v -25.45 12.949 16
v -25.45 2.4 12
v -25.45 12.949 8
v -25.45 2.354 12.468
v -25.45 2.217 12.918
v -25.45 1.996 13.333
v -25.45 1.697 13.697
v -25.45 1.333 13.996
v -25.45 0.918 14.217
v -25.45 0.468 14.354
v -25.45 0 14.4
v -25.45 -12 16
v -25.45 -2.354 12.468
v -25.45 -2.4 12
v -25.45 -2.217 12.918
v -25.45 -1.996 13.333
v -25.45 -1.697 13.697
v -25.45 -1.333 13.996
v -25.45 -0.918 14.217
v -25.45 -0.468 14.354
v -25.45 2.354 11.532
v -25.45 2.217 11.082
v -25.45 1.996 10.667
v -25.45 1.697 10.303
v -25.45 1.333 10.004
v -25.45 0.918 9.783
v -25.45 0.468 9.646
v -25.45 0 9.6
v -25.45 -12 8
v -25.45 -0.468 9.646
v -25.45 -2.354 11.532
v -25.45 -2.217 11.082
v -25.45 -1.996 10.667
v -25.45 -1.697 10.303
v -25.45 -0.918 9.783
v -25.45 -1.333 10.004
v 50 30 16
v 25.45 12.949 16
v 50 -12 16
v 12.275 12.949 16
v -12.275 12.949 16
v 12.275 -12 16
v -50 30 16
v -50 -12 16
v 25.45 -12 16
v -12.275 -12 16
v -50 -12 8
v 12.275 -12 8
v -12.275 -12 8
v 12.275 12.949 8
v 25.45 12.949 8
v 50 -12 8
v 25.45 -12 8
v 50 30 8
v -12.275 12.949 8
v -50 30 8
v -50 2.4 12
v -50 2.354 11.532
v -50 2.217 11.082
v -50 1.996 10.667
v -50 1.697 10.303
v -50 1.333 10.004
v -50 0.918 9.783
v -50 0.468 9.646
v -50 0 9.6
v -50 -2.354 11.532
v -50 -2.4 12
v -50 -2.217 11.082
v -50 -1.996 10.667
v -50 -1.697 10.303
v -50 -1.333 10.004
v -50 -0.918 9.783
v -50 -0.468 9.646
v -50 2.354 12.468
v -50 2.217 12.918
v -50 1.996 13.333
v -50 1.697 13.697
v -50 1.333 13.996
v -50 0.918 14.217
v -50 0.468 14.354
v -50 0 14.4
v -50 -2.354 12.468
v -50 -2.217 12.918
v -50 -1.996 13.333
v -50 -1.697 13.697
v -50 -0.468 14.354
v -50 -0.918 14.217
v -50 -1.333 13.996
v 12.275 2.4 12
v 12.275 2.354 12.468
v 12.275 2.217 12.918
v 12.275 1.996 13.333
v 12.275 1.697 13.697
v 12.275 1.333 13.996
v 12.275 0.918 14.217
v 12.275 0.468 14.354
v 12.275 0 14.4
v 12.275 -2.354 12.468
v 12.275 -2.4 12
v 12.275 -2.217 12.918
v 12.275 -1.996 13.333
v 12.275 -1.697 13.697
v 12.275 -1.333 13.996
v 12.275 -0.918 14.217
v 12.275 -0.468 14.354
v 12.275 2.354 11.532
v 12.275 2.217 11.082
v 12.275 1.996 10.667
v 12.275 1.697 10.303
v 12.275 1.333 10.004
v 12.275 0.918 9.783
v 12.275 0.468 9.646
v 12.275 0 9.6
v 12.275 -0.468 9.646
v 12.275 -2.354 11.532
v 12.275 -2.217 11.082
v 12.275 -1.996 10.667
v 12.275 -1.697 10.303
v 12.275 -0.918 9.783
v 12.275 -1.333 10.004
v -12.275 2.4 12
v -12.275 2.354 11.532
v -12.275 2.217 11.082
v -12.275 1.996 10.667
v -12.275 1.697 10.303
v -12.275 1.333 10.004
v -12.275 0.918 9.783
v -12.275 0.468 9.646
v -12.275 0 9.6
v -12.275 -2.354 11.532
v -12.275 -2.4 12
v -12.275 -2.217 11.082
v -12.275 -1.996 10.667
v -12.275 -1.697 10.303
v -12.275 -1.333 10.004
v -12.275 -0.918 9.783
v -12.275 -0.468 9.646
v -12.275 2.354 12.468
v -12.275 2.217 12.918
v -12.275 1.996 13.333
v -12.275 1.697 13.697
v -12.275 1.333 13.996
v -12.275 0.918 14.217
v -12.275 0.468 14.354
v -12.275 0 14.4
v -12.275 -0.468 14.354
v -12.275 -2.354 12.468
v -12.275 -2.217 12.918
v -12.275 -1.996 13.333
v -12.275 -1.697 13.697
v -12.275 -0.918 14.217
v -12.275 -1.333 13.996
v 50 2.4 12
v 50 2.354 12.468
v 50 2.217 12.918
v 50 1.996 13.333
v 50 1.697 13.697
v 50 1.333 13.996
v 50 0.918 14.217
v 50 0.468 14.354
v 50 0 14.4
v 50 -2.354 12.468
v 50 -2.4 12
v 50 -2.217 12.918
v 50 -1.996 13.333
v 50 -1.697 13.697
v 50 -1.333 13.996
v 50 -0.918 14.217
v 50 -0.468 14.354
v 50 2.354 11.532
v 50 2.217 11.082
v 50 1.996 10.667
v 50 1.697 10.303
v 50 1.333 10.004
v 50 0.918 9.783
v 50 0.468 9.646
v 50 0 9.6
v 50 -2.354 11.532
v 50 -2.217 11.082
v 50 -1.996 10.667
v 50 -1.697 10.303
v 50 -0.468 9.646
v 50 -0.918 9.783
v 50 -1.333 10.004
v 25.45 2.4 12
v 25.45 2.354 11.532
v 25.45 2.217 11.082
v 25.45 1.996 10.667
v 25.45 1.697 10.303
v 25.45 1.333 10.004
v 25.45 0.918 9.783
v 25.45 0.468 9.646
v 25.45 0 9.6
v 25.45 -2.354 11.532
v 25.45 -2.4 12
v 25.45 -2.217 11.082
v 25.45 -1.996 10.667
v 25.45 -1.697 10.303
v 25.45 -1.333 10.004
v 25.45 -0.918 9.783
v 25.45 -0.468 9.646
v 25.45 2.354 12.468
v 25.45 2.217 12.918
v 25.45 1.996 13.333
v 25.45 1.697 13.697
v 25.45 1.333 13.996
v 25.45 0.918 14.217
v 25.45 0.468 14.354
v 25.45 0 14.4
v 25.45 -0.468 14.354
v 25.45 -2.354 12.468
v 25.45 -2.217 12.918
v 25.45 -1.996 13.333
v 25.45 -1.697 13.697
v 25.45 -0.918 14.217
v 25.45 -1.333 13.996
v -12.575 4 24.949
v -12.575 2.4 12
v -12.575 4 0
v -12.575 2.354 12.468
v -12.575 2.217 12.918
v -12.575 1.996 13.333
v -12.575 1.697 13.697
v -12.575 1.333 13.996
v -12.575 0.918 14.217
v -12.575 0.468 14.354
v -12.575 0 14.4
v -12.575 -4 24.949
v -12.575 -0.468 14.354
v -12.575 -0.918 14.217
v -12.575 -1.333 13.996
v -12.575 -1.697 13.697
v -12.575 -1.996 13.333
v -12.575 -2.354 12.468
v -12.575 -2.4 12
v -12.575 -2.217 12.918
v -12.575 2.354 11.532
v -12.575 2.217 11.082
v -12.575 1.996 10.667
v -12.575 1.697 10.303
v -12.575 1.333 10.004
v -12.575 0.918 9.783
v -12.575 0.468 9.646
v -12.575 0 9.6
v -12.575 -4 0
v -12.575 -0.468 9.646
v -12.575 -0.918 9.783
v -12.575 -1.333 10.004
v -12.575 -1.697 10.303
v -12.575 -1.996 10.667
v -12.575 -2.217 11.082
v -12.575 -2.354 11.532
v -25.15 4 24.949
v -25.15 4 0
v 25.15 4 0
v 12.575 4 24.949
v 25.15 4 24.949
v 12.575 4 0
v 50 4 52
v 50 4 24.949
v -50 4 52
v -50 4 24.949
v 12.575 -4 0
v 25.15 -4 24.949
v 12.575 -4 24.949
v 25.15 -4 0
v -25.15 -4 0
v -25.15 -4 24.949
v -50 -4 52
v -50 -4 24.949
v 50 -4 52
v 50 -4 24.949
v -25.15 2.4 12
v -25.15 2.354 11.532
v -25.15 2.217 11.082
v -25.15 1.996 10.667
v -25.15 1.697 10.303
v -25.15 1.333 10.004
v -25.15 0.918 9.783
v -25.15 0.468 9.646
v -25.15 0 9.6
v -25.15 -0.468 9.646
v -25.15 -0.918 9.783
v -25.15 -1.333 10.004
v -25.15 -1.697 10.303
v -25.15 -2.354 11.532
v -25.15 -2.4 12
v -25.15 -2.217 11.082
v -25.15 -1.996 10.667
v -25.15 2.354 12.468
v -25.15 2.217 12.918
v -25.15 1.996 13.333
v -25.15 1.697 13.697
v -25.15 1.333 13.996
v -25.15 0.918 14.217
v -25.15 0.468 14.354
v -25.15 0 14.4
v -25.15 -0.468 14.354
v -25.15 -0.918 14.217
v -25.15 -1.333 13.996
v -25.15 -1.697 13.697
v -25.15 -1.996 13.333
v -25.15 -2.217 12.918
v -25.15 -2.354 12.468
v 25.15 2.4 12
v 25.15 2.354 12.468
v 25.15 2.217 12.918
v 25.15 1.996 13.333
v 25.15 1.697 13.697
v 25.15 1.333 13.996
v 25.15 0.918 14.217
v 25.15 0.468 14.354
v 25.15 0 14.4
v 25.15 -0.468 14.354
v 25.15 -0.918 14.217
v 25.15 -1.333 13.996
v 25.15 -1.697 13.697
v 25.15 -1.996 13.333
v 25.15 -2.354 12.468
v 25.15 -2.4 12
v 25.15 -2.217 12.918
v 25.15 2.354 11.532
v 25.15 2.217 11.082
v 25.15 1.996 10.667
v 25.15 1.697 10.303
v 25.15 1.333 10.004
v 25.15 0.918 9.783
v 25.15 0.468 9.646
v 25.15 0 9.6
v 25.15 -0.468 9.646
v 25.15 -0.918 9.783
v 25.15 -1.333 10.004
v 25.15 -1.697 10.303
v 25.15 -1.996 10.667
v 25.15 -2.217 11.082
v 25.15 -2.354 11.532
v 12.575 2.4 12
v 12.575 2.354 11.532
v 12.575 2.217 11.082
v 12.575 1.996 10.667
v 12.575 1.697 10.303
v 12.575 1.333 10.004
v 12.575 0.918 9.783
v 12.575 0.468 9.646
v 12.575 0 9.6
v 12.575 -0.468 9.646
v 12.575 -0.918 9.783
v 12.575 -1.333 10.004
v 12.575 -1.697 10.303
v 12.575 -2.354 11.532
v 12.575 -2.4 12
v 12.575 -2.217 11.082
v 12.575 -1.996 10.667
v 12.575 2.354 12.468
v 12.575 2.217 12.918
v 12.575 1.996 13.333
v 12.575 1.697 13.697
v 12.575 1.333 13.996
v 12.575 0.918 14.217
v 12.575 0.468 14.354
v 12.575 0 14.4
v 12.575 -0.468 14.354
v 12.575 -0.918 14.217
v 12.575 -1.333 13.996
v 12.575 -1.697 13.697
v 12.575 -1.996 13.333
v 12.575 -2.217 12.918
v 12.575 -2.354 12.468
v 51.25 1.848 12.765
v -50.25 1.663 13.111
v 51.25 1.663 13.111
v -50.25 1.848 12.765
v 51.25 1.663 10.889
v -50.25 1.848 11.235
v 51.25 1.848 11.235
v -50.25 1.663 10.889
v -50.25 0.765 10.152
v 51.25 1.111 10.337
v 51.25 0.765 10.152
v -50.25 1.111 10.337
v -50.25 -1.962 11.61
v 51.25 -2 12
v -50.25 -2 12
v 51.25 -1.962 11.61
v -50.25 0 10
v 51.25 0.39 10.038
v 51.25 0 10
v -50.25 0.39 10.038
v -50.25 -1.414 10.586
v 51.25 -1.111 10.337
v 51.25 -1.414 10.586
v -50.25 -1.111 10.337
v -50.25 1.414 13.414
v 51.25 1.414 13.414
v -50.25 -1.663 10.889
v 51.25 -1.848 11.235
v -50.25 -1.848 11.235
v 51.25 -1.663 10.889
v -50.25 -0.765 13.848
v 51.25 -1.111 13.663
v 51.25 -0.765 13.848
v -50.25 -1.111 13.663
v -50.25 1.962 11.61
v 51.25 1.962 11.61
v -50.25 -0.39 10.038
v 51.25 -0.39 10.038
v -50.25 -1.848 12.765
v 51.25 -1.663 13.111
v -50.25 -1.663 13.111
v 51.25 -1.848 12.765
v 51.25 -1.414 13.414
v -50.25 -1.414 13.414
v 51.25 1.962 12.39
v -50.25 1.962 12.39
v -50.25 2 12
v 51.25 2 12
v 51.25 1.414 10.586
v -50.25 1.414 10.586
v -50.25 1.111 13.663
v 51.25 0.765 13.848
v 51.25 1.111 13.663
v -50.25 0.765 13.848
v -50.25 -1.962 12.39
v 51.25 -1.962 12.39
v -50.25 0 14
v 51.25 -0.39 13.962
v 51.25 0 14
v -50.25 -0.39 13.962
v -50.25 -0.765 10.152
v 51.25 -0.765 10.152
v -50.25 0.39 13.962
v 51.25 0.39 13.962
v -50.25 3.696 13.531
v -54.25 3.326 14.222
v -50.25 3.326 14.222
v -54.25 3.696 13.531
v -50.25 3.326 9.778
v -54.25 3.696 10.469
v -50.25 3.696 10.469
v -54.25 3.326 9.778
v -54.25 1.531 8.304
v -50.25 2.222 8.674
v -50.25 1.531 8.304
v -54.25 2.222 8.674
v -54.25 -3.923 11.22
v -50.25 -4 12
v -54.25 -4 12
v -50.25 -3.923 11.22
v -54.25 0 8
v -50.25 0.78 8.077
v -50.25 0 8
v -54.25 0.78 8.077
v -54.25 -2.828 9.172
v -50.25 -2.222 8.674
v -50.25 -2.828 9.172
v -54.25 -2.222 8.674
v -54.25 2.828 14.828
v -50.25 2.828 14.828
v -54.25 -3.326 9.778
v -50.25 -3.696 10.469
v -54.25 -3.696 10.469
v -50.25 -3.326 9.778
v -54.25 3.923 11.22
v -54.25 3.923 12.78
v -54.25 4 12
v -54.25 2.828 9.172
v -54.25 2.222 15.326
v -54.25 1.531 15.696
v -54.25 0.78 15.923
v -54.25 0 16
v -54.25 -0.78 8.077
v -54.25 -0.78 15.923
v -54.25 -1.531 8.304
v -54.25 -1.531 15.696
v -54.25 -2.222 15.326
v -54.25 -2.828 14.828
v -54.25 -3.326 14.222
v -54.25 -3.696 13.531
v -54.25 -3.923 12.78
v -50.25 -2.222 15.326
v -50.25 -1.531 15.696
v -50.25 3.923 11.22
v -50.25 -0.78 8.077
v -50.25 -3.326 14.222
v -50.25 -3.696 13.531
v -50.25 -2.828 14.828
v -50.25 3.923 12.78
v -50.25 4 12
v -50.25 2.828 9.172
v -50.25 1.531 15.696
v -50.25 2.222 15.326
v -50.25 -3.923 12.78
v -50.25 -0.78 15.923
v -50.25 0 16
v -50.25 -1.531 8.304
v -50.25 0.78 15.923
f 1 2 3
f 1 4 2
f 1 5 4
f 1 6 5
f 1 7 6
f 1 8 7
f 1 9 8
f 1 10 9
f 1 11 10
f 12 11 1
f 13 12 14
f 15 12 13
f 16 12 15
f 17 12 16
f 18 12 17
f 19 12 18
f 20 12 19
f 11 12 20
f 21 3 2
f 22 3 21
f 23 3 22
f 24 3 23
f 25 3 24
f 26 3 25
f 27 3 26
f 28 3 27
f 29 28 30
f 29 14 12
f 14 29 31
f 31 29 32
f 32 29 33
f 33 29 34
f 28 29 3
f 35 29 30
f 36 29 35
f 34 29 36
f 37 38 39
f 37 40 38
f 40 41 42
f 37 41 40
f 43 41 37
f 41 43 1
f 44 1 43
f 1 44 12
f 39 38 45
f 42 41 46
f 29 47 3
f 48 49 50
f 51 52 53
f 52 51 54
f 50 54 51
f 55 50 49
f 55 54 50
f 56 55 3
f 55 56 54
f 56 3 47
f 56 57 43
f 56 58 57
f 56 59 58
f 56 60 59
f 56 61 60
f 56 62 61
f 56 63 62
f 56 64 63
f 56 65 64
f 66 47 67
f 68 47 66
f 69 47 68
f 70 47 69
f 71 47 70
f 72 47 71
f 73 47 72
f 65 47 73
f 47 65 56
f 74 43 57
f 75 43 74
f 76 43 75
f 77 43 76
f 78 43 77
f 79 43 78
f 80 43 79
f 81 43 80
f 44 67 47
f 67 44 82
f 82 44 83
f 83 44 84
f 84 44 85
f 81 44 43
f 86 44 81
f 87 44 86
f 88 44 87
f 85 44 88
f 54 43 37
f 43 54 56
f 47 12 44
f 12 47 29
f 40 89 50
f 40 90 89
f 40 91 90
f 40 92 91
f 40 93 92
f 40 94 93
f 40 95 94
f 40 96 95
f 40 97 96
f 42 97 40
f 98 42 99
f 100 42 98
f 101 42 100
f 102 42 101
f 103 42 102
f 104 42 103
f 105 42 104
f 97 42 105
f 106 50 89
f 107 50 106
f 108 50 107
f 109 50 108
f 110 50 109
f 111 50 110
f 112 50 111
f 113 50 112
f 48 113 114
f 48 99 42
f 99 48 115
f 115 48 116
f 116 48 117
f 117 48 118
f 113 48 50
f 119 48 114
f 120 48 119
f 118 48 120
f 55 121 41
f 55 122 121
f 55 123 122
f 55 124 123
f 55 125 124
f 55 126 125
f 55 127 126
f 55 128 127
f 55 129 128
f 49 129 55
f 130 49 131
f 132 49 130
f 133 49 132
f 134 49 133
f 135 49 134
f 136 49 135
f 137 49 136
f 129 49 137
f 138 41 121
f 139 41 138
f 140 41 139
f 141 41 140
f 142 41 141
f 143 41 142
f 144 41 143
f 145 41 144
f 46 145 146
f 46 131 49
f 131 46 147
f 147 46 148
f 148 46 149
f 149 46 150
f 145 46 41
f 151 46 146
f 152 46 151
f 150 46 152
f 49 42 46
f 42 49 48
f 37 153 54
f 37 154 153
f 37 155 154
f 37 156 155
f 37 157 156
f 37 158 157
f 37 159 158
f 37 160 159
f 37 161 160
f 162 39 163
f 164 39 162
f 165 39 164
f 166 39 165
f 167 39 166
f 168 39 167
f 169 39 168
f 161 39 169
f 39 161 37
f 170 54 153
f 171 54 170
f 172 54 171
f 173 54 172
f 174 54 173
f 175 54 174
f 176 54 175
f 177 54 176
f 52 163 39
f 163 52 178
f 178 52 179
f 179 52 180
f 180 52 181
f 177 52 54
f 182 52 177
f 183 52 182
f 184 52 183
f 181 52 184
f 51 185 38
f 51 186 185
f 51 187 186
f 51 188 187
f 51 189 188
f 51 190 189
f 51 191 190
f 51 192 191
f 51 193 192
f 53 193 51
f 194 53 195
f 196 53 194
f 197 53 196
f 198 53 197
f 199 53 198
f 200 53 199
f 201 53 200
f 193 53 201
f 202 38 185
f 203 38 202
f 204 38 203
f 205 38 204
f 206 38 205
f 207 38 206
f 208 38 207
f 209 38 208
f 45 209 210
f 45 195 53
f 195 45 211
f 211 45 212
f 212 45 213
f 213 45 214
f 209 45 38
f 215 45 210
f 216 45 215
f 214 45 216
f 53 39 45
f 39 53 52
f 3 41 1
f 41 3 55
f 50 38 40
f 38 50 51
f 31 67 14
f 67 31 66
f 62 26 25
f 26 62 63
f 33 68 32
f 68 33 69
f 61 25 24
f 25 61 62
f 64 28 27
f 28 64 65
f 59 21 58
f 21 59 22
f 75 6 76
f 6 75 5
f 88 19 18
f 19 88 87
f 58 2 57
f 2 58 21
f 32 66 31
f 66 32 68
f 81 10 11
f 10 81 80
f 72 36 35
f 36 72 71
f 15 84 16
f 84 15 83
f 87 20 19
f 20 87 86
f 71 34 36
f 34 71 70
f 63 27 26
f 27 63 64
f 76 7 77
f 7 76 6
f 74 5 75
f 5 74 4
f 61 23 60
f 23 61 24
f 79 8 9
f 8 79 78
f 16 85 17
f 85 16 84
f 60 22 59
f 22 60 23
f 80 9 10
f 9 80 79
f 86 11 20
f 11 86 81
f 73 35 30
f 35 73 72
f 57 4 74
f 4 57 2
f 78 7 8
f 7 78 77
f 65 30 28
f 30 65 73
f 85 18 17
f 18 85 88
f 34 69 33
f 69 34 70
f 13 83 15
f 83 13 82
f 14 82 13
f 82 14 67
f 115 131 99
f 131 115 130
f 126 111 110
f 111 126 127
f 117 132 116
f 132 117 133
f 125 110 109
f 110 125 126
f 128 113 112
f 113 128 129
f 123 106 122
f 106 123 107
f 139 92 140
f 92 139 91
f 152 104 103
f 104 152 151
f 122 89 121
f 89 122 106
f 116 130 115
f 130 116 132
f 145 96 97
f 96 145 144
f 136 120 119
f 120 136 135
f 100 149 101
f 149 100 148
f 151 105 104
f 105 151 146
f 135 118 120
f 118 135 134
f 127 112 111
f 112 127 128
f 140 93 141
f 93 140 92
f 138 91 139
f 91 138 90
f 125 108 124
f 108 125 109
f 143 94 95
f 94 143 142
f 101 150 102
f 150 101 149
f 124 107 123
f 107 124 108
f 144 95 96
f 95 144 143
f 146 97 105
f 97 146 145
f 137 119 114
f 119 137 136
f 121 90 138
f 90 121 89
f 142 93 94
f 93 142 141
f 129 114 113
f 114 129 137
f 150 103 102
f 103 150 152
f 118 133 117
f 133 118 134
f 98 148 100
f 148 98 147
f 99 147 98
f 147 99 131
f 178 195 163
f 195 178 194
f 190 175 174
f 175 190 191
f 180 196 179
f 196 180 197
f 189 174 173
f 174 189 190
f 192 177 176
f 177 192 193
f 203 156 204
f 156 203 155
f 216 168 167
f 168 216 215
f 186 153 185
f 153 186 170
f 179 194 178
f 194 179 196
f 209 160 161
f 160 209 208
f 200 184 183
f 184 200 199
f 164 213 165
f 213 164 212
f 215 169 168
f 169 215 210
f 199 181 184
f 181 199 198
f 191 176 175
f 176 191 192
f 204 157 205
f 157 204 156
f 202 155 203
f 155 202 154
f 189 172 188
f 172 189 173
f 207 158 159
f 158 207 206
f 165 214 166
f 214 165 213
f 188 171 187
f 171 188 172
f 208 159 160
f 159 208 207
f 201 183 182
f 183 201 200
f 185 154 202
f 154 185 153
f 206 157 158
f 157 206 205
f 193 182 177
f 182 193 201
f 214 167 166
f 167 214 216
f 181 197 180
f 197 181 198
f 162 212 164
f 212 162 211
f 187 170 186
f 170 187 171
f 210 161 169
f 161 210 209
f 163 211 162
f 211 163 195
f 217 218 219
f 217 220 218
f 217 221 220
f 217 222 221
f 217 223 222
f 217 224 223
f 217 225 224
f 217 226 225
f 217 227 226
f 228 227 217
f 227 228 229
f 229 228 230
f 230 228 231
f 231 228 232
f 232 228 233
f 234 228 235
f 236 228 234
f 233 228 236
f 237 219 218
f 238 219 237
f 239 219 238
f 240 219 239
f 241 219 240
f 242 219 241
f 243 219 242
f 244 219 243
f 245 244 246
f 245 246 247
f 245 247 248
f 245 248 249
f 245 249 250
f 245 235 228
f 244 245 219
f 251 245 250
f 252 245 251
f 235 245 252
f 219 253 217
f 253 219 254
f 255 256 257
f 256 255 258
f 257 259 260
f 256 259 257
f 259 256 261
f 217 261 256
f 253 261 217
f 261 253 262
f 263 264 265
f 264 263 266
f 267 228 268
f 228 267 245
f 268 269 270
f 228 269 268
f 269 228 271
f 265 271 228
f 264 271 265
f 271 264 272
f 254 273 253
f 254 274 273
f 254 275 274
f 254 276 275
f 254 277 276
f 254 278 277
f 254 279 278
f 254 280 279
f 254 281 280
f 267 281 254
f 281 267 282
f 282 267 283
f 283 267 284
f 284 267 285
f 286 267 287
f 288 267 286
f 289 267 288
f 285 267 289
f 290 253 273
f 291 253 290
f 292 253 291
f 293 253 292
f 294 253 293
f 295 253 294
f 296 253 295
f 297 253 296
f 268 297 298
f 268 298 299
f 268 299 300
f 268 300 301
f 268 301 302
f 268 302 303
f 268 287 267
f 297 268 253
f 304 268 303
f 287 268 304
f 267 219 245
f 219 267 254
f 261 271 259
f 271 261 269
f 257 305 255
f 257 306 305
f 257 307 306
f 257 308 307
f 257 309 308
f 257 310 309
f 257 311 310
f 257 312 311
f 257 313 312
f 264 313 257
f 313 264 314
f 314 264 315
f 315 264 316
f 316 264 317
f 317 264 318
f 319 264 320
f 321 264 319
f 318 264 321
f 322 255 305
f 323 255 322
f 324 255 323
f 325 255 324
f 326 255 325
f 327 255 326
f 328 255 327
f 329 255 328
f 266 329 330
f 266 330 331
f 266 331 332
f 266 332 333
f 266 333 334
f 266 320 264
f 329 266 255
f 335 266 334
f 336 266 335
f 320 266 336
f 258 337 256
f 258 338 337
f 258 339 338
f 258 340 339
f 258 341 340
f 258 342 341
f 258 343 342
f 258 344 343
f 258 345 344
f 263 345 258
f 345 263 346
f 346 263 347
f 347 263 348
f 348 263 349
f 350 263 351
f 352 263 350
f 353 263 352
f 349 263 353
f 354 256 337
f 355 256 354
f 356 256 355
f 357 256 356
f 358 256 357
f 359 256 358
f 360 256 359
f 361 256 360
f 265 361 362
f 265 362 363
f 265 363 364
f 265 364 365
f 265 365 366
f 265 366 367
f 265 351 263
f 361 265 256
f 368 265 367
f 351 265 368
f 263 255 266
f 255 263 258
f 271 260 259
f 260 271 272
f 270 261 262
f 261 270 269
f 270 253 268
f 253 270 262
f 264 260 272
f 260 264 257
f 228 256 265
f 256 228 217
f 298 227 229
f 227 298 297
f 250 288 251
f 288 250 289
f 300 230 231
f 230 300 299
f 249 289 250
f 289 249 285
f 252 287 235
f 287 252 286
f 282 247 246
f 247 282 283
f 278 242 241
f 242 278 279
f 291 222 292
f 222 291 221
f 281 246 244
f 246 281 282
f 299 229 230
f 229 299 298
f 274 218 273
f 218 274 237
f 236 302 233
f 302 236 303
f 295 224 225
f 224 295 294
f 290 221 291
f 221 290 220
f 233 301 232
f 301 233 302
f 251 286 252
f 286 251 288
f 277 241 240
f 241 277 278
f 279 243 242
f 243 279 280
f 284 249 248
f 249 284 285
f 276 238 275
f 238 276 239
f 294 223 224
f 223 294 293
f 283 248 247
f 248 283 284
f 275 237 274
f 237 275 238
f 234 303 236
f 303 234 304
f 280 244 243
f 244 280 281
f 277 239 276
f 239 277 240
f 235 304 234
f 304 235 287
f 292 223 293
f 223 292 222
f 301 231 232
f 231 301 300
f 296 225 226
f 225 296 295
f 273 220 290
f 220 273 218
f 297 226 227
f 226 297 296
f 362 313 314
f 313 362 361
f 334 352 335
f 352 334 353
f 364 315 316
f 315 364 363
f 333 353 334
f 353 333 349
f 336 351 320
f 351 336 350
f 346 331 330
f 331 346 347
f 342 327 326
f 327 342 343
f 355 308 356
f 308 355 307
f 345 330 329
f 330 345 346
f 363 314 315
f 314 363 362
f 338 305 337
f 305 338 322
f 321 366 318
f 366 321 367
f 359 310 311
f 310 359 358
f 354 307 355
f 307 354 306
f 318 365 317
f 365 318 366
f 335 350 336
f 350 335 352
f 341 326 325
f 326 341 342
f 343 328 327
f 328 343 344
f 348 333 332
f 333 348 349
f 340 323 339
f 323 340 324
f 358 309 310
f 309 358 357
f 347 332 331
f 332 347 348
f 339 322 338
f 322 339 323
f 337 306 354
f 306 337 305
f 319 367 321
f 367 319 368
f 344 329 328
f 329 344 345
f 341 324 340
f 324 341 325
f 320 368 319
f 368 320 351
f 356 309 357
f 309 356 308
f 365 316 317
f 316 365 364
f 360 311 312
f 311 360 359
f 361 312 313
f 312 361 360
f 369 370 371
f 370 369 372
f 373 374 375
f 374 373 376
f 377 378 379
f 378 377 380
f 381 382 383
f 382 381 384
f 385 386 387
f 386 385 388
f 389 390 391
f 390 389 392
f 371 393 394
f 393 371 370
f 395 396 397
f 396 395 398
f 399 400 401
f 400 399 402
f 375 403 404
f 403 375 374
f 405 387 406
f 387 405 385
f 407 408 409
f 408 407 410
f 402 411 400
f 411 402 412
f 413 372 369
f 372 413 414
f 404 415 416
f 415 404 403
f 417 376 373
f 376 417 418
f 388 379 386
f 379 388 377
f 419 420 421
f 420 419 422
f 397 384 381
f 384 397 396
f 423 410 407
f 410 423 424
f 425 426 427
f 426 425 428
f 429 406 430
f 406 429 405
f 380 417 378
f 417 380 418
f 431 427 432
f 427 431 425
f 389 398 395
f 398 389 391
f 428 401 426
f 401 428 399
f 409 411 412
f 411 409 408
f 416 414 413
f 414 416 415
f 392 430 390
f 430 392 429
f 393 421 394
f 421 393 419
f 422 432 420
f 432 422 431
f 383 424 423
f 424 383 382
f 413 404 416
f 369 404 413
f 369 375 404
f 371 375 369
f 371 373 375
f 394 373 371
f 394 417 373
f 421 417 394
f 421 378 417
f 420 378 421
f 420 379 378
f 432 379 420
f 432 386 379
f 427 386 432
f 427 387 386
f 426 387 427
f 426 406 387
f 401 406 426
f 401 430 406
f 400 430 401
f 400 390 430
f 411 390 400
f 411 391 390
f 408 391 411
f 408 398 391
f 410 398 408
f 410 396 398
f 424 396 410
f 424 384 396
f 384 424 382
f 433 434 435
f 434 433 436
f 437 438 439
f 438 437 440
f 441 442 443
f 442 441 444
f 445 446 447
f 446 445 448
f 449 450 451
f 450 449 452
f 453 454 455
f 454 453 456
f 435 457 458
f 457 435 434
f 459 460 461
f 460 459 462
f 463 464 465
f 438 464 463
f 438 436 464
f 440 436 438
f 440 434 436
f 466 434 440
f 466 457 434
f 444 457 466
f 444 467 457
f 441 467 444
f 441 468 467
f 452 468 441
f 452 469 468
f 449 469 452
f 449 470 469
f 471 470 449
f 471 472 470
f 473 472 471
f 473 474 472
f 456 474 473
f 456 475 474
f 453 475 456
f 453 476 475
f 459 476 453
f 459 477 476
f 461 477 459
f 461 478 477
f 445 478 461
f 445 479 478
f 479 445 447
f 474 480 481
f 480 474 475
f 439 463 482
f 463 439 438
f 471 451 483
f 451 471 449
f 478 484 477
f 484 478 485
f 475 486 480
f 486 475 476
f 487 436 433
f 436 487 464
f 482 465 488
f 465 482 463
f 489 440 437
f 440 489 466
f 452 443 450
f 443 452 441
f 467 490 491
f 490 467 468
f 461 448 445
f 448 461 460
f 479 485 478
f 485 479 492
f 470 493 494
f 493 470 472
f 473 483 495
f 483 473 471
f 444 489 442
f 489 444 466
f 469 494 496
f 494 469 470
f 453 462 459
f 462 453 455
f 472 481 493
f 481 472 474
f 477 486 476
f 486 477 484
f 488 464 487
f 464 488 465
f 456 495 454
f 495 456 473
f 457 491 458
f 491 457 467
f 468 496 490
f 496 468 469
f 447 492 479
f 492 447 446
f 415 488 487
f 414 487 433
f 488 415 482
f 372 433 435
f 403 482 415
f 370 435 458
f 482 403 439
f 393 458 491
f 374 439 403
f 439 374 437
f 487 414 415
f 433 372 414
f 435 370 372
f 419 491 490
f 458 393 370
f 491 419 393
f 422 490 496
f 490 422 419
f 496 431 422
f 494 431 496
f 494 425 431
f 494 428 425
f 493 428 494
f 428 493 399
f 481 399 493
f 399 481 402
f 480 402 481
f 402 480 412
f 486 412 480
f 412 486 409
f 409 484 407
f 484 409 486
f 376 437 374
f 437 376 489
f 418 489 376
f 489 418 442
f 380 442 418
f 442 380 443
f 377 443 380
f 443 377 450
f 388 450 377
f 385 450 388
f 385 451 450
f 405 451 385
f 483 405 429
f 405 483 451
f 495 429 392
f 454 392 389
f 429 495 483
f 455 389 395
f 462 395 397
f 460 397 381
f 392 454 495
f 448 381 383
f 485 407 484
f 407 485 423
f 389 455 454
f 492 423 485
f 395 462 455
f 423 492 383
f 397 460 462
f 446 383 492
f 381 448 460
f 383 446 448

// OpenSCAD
$fn = 32;

// ------------------------------------------------------------------------
// Butt hinge: hinge 100 mm, leaf swung 270 deg
// Every part is its own module, assembly() places every instance.
// ------------------------------------------------------------------------

// --- part 1 ---
module hinge_base() {
  difference() {
    union() {
      translate([-50, -12, -4]) cube([24.55, 42, 8]);
      translate([-12.275, -12, -4]) cube([24.55, 42, 8]);
      translate([25.45, -12, -4]) cube([24.55, 42, 8]);
      translate([-50, 12.949, -4]) cube([100, 17.051, 8]);
    }
    translate([-37.725, 0, 0]) rotate([0, 90, 0]) cylinder(h = 26.55, d = 4.8, center = true);
    translate([0, 0, 0]) rotate([0, 90, 0]) cylinder(h = 26.55, d = 4.8, center = true);
    translate([37.725, 0, 0]) rotate([0, 90, 0]) cylinder(h = 26.55, d = 4.8, center = true);
  }
}

// --- part 2 ---
module hinge_mover() {
  difference() {
    union() {
      translate([-25.15, -40, -4]) cube([12.575, 52, 8]);
      translate([12.575, -40, -4]) cube([12.575, 52, 8]);
      translate([-50, -40, -4]) cube([100, 27.051, 8]);
    }
    translate([-18.863, 0, 0]) rotate([0, 90, 0]) cylinder(h = 14.575, d = 4.8, center = true);
    translate([18.863, 0, 0]) rotate([0, 90, 0]) cylinder(h = 14.575, d = 4.8, center = true);
  }
}

// --- part 3 ---
module hinge_pin() {
  rotate([0, 90, 0]) cylinder(h = 102.5, d = 4, center = true);
  translate([-54.25, 0, 0]) rotate([0, 90, 0]) cylinder(h = 4, d = 8);
}

// --- assembly ---
module assembly() {
  color([0.80, 0.24, 0.20]) translate([0, 0, 12]) rotate([0, 0, 0]) hinge_base();
  color([0.20, 0.45, 0.75]) translate([0, 0, 12]) rotate([270, 0, 0]) hinge_mover();
  color([0.25, 0.62, 0.32]) translate([0, 0, 12]) rotate([0, 0, 0]) hinge_pin();
}

assembly();
